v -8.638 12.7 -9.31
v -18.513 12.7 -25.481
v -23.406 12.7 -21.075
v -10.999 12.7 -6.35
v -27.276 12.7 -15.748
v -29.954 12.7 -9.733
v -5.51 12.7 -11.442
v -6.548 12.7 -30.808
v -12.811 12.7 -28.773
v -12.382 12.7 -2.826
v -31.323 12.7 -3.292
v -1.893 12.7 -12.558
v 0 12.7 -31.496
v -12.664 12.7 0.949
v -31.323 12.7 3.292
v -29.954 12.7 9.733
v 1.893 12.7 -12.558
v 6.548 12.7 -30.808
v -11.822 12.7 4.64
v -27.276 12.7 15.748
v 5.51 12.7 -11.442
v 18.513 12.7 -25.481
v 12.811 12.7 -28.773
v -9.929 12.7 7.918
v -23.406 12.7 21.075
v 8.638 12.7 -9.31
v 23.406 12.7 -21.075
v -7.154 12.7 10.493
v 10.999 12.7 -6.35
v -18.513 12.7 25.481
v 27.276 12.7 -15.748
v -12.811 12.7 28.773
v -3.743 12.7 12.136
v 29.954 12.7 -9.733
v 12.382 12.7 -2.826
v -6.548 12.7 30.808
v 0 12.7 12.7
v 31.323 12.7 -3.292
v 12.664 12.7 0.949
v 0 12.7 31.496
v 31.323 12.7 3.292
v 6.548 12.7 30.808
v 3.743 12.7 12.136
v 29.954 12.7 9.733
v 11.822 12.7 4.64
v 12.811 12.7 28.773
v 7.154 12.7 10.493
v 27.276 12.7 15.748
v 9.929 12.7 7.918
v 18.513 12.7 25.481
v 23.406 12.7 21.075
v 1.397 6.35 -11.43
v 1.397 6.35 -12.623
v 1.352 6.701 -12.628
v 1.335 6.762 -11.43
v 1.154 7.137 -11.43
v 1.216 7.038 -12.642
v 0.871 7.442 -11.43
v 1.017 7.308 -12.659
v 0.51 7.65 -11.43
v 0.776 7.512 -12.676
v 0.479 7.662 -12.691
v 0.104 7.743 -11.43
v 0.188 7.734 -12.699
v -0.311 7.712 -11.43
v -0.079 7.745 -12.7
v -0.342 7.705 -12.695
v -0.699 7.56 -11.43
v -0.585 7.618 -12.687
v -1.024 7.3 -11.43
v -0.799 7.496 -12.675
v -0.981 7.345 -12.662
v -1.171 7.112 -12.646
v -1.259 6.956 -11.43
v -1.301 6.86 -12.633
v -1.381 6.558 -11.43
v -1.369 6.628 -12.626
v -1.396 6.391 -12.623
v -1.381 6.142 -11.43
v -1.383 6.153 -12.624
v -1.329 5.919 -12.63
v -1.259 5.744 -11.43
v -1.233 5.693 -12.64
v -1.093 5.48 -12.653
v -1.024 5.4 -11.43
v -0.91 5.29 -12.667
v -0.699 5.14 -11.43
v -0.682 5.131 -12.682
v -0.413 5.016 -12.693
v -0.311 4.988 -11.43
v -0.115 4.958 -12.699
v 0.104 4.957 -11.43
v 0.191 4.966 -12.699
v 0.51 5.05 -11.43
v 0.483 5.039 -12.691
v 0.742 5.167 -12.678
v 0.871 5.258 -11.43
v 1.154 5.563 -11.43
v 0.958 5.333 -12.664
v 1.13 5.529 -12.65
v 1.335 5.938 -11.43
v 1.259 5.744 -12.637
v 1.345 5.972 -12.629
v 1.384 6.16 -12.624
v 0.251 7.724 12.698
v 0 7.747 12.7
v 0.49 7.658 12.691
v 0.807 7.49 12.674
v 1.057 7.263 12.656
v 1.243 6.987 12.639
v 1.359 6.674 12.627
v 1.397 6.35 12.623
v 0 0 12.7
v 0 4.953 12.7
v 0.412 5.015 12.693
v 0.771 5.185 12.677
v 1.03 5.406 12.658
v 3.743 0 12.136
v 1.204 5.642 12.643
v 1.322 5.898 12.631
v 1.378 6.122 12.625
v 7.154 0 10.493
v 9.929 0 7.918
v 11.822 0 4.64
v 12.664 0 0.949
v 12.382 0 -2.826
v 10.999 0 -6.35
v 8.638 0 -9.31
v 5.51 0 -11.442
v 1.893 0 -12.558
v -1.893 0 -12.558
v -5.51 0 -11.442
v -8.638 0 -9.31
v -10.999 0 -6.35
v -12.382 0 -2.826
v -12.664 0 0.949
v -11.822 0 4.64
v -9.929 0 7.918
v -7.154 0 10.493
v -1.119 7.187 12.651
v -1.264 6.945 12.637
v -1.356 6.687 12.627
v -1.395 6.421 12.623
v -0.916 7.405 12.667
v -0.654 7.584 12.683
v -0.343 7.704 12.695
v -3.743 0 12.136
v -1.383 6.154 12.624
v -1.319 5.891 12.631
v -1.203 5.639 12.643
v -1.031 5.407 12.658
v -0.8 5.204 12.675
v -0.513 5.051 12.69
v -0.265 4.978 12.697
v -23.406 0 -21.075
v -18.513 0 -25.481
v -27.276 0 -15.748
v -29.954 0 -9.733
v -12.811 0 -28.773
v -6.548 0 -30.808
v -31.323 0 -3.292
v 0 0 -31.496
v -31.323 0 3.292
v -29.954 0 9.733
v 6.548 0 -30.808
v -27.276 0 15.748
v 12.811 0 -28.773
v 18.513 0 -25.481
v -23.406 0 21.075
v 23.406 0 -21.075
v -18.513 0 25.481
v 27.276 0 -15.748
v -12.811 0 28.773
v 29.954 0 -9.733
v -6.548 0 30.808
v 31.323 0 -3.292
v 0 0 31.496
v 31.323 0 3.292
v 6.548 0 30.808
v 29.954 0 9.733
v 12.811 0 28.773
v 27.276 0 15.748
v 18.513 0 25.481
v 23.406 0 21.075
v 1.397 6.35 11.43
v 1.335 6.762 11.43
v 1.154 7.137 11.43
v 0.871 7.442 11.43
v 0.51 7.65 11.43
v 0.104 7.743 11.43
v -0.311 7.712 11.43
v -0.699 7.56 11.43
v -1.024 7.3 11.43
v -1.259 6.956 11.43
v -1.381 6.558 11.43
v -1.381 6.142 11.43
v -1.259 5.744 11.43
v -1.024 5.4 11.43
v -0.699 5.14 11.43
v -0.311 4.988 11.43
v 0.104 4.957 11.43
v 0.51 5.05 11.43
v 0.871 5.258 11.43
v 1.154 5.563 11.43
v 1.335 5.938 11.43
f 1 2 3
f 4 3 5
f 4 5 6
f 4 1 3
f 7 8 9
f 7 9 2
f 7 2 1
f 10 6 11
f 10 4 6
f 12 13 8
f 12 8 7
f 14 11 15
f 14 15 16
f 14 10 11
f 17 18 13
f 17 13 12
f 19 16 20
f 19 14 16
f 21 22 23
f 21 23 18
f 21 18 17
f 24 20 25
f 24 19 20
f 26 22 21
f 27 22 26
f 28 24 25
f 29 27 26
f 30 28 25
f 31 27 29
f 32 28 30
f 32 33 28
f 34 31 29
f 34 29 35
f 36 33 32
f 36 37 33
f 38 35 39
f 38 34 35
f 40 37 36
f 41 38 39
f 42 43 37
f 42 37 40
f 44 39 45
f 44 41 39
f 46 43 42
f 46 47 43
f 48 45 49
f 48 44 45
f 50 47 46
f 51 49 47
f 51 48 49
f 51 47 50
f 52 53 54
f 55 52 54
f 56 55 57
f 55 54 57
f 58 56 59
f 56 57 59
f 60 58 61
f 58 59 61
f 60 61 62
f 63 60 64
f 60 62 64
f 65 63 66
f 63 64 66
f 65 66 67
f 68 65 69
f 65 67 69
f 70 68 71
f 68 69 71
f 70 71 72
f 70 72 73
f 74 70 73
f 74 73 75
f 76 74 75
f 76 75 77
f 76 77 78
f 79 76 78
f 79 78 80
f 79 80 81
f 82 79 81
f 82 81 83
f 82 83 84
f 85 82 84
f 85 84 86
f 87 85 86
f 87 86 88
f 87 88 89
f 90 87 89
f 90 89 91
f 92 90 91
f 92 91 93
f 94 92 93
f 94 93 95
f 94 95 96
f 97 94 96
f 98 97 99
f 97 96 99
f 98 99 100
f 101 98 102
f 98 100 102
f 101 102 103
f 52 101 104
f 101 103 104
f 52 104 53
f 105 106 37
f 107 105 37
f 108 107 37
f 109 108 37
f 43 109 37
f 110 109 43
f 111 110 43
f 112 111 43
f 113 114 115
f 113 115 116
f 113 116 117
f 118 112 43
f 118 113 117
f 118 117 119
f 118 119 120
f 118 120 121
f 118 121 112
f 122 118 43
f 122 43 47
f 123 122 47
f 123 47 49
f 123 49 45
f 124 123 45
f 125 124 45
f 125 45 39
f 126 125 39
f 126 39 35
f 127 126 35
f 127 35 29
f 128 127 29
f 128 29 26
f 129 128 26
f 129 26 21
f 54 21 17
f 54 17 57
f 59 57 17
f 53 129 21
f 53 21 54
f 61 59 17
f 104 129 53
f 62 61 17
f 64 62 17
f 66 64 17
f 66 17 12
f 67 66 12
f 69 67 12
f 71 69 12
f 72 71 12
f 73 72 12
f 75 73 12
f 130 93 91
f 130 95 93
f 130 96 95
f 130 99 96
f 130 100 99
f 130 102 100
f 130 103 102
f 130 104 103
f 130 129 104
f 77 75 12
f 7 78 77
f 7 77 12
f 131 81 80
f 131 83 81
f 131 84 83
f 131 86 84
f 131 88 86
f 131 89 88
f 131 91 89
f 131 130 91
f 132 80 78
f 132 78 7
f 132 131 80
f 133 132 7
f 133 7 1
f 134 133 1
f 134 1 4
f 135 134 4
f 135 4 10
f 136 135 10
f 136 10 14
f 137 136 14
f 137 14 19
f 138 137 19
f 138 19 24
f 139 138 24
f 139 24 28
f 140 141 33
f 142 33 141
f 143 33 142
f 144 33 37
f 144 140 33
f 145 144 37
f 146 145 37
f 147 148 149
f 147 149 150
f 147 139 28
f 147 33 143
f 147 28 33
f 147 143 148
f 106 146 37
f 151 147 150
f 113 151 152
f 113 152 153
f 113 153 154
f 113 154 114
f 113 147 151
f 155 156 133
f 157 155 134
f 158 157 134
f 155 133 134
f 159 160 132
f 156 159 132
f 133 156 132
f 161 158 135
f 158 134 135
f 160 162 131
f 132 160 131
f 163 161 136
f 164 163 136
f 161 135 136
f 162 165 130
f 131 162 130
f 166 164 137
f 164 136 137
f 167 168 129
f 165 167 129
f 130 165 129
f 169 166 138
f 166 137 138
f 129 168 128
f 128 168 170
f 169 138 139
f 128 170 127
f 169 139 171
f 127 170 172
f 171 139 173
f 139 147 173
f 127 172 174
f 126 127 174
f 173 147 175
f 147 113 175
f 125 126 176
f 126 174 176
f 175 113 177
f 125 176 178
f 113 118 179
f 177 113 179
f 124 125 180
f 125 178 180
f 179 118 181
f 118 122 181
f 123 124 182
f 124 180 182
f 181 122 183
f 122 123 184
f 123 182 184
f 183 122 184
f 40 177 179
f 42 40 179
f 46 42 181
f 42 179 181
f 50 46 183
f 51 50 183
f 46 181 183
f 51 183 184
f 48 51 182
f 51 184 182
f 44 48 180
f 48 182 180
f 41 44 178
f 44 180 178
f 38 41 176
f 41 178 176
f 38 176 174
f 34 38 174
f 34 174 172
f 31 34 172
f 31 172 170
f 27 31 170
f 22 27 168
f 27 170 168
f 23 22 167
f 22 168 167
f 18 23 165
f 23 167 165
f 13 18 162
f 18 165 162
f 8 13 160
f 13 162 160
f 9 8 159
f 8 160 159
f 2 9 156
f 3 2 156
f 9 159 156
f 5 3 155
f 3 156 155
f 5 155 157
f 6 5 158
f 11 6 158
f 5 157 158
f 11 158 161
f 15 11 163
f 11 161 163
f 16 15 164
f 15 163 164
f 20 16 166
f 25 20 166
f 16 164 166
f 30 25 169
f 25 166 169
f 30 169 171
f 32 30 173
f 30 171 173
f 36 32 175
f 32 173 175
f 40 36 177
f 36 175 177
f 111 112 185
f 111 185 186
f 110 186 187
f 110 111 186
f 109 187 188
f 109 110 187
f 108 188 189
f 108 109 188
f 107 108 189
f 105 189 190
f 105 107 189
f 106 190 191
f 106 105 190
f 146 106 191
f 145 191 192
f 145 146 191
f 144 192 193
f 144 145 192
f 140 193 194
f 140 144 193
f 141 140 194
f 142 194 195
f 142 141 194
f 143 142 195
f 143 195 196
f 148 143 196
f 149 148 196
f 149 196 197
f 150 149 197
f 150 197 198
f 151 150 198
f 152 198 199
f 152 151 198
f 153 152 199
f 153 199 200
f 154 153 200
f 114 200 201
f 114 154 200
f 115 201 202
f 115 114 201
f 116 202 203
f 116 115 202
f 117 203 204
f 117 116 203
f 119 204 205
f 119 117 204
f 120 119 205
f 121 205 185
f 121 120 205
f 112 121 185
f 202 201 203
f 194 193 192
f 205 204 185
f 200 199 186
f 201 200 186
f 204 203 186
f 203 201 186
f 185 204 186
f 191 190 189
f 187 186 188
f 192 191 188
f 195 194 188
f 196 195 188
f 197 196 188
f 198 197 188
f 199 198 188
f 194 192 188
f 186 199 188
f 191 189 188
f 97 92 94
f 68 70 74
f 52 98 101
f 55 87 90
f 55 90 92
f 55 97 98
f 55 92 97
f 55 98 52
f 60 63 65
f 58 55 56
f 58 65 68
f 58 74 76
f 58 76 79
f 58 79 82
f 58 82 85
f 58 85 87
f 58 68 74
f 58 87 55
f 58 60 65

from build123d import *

# Parameters (mm, degrees)
SKETCH1_R           = 31.496
SKETCH1_R_2         = 12.7
BOSS_EXTRUDE1_DEPTH = 12.7
BOSS_EXTRUDE2_START = -5.08
SKETCH3_R           = 1.397
BOSS_EXTRUDE2_DEPTH = 6.35


with BuildPart() as part:
    # Sketch1 → Boss-Extrude1 (new body)
    with BuildSketch(Plane(origin=(0, 0, 0), x_dir=(1, 0, 0), z_dir=(0, 1, 0))):
        with Locations(Location((0, 0, 0), (0, 0, 270))):
            Circle(SKETCH1_R)
        with Locations(Location((0, 0, 0), (0, 0, 270))):
            Circle(SKETCH1_R_2, mode=Mode.SUBTRACT)
    extrude(amount=BOSS_EXTRUDE1_DEPTH)

    # Sketch3 → Boss-Extrude2 (add)
    with BuildSketch(Plane.XY.offset(-12.7).offset(BOSS_EXTRUDE2_START)):
        with Locations((0, 6.35)):
            Circle(SKETCH3_R)
    boss_extrude2 = extrude(amount=BOSS_EXTRUDE2_DEPTH)

    # Mirror1: Boss-Extrude2 across plane
    add(boss_extrude2.mirror(Plane.XY))


solid = part.part
